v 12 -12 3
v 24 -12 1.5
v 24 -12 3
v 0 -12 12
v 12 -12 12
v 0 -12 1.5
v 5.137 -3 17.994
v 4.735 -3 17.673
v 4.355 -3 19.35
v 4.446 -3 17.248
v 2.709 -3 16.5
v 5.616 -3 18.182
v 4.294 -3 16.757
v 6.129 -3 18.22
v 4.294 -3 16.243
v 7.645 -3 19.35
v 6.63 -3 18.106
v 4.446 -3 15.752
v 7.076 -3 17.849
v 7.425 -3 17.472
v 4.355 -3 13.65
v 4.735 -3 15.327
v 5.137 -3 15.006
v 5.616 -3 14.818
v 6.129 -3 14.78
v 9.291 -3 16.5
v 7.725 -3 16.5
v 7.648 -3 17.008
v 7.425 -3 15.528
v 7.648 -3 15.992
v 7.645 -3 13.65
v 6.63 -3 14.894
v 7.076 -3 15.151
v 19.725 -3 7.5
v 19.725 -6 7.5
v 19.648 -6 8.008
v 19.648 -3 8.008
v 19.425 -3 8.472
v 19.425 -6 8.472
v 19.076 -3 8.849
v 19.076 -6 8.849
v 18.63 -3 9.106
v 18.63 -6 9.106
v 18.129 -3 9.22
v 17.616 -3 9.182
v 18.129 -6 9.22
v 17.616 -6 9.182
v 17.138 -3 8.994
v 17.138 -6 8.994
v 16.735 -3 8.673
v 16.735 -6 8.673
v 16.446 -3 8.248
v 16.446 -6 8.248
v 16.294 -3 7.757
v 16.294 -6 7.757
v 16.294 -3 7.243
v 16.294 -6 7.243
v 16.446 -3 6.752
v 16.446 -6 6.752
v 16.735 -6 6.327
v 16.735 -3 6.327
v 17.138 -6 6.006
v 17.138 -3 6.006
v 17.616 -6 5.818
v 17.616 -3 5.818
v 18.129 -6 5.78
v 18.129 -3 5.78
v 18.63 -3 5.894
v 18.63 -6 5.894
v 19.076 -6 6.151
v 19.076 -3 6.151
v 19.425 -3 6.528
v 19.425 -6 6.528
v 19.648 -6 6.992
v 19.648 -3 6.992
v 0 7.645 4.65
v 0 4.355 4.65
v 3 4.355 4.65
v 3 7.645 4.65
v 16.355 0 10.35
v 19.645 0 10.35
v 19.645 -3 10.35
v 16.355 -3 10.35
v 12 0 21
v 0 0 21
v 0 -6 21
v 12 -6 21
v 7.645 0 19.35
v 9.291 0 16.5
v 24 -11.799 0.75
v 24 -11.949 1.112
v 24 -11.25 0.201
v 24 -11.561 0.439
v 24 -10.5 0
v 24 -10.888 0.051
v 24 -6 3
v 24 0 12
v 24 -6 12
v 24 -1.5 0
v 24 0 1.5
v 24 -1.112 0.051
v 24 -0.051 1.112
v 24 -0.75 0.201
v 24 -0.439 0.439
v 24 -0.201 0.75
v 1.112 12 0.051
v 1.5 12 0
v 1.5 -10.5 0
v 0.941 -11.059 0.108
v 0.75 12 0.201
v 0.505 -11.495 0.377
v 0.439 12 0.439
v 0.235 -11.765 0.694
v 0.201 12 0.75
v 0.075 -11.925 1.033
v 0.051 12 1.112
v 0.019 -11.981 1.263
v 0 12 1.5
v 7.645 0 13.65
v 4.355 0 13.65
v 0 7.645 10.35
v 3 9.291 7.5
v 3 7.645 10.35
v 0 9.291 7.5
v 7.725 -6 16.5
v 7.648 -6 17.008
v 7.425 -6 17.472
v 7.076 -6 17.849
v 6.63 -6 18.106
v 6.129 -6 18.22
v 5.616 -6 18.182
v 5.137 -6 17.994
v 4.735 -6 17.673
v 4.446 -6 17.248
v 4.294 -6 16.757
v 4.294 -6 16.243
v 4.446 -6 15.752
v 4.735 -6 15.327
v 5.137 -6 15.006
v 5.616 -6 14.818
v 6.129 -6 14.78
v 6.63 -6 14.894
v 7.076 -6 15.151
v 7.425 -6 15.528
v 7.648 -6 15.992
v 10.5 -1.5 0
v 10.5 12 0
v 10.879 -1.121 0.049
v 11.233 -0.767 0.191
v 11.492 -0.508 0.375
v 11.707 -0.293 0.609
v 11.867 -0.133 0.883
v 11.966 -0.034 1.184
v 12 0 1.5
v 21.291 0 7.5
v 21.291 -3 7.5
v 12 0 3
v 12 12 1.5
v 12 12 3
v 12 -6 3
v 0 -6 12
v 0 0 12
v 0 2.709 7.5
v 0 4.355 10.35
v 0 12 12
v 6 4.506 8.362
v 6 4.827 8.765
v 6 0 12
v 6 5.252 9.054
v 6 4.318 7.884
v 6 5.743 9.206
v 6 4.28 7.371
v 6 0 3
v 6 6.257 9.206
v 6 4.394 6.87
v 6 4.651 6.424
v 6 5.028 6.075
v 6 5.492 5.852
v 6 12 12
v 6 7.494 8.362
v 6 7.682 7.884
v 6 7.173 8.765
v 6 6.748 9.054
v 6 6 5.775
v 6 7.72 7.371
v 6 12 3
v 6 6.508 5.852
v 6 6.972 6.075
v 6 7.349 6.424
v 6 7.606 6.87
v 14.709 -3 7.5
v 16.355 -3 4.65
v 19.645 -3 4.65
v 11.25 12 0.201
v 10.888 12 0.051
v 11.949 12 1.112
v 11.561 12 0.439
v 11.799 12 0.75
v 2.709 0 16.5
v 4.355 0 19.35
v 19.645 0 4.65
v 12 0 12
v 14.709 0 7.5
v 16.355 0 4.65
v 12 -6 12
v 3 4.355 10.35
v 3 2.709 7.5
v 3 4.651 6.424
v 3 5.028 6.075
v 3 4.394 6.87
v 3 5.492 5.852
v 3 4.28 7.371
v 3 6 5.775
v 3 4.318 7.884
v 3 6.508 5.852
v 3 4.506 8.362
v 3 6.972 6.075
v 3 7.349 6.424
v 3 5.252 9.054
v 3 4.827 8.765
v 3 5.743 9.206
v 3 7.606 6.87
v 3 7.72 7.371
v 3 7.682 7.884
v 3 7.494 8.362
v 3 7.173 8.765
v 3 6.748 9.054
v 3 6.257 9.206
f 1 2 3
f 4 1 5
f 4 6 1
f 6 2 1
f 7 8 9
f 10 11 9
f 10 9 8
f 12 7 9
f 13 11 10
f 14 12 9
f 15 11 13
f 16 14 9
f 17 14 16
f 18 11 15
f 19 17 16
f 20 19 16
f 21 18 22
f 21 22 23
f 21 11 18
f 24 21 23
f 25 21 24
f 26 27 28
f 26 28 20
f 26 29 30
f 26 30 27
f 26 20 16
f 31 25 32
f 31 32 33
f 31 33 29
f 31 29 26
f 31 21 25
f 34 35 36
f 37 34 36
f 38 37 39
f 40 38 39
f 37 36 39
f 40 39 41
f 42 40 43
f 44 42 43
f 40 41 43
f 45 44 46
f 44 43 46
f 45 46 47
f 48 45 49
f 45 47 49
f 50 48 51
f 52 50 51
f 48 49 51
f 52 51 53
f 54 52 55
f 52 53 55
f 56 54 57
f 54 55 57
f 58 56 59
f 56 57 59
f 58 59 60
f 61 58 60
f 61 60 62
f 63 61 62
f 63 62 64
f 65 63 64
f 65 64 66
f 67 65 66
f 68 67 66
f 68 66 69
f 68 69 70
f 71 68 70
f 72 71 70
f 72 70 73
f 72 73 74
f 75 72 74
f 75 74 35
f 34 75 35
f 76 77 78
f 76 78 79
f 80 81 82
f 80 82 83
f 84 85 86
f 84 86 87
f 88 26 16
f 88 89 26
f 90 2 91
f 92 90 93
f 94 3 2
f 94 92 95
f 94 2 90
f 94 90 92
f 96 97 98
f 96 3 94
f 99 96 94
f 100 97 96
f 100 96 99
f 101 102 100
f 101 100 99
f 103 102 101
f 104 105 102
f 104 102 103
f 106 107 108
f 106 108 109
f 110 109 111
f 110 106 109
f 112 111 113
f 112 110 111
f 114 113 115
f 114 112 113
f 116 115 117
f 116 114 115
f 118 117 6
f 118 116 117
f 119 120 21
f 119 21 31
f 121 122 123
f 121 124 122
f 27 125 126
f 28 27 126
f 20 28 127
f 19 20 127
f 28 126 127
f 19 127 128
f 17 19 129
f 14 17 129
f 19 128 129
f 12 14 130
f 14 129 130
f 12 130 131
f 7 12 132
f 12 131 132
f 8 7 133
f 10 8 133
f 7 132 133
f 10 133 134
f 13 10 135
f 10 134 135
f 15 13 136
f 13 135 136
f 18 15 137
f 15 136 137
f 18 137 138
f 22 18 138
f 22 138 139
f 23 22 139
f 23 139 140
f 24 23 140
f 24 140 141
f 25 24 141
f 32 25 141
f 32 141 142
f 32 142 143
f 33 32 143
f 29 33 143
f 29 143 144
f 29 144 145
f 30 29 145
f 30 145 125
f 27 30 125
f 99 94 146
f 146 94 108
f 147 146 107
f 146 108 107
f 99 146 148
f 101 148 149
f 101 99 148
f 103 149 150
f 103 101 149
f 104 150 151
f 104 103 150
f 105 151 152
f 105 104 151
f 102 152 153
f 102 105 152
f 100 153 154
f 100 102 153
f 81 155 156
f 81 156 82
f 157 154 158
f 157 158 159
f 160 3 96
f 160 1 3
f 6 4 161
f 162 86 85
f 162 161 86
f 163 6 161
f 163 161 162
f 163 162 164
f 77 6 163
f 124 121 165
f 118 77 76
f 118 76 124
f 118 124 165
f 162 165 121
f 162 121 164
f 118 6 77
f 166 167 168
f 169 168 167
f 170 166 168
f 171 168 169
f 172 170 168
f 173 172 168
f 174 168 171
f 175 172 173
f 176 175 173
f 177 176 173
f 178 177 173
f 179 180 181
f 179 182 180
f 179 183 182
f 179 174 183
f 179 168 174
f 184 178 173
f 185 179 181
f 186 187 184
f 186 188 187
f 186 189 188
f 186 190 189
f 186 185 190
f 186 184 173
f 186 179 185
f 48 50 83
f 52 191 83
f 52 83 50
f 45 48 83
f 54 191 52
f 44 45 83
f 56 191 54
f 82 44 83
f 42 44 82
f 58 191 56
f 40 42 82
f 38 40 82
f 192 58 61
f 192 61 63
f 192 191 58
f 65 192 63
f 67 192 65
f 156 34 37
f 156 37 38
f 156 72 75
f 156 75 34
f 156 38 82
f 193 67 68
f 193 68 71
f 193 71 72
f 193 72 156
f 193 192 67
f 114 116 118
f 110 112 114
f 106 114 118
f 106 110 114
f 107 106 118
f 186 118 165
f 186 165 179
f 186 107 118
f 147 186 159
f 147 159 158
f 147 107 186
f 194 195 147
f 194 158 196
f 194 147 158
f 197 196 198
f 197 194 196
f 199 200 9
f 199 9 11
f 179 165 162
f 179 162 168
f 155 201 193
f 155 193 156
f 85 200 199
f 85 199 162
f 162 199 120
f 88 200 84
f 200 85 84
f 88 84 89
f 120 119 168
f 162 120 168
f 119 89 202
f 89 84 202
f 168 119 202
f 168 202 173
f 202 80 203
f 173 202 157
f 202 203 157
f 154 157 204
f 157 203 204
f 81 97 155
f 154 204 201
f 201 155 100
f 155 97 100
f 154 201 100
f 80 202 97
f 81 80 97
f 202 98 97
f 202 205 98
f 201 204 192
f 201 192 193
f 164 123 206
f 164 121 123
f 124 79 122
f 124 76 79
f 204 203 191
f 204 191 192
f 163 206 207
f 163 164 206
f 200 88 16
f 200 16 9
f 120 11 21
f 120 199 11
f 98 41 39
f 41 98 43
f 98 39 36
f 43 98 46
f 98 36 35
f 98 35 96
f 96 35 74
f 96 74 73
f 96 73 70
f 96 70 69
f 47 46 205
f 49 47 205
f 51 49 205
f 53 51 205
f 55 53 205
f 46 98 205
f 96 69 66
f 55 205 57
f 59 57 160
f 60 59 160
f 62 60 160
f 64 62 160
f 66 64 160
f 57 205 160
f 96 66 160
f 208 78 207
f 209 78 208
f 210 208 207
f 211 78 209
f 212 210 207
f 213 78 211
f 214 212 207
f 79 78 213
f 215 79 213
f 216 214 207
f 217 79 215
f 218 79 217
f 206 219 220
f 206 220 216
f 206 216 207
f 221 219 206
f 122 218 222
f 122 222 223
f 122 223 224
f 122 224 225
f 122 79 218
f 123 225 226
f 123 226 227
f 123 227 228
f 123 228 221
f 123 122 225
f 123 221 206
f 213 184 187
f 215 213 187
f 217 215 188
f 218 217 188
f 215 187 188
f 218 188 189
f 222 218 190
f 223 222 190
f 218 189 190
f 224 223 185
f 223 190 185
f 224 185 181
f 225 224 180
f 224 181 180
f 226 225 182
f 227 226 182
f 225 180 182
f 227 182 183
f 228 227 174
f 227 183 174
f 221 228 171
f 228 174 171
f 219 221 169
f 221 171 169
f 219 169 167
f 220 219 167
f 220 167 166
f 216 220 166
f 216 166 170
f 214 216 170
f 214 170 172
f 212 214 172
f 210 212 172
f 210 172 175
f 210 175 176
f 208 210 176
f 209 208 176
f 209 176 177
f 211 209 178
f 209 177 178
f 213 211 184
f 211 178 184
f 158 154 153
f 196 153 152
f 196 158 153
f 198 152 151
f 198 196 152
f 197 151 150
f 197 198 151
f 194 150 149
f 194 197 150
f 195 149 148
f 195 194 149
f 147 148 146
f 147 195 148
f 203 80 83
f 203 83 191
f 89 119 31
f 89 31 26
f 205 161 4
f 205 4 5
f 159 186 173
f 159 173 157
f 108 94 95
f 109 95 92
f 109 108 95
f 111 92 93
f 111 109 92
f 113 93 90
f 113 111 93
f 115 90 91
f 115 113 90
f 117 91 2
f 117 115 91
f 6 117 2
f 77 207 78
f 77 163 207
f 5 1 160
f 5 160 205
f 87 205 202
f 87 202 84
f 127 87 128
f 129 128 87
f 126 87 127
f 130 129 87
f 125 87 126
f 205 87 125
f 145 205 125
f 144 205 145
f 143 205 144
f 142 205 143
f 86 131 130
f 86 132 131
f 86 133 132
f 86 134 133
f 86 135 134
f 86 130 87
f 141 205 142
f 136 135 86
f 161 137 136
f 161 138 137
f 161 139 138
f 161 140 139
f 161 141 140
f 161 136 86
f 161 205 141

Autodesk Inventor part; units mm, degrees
ref_plane "YZ Plane" through (0, 0, 0) normal (1, 0, 0) x (0, 1, 0)
ref_plane "XZ Plane" through (0, 0, 0) normal (0, 1, 0) x (-1, 0, 0)
ref_plane "XY Plane" through (0, 0, 0) normal (0, 0, 1) x (1, 0, 0)
sketch "Sketch1" plane through (0, 0, 0) normal (0, 0, 1) x (1, 0, 0)
  line L0 (0, 0) -> (12, 0)
  line L1 (12, 0) -> (12, 12)
  line L2 (12, 12) -> (0, 12)
  line L3 (0, 12) -> (0, 0)
  line L4 (12, 0) -> (0, 0)
  line L5 (0, 0) -> (0, -12)
  line L6 (0, -12) -> (12, -12)
  line L7 (12, -12) -> (12, 0)
  line L8 (12, 0) -> (24, 0)
  line L9 (24, 0) -> (24, -12)
  line L10 (24, -12) -> (12, -12)
  line L11 (12, -12) -> (12, 0)
  line L12 (0, -12) -> (-12, -12)
  line L13 (-12, -12) -> (-12, 0)
  line L14 (-12, 0) -> (0, 0)
  line L15 (0, 0) -> (0, -12)
  line L16 (0, -12) -> (12, -12)
  line L17 (12, -12) -> (12, -24)
  line L18 (12, -24) -> (0, -24)
  line L19 (0, -24) -> (0, -12)
  dimension "d0" = 12
  dimension "d1" = 12
  dimension "d2" = 12
  dimension "d3" = 12
  dimension "d4" = 12
  dimension "d5" = 12
  dimension "d6" = 12
  dimension "d7" = 12
  dimension "d8" = 12
  dimension "d9" = 12
extrude "Extrusion1" add sketch "Sketch1" along normal blind 3
sketch "Sketch2" plane through (0, 0, 3) normal (0, 0, 1) x (1, 0, 0)
  line L0 (-12, 0) -> (-12, -12) projected
  line L1 (-12, -12) -> (-12, -6)
  line L2 (-12, -6) -> (0, -6)
  line L3 (-12, -12) -> (0, -12) projected
  line L4 (0, -6) -> (0, -12)
  line L5 (0, -12) -> (-12, -12)
  line L6 (12, -24) -> (12, -12) projected
  line L7 (12, -12) -> (12, -6)
  line L8 (12, -6) -> (24, -6)
  line L9 (24, -12) -> (24, 0) projected
  line L10 (12, -12) -> (24, -12) projected
  line L11 (24, -6) -> (24, -12)
  line L12 (24, -12) -> (12, -12)
  line L13 (0, 0) -> (0, -6)
  line L14 (12, 0) -> (12, 12) projected
  line L15 (0, 0) -> (12, 0)
  line L16 (12, 0) -> (12, -6)
  line L17 (12, -12) -> (0, -12)
  line L18 (0, 12) -> (0, 0) projected
  line L19 (0, 0) -> (0, 12)
  line L20 (0, 12) -> (6, 12)
  line L21 (12, 12) -> (0, 12) projected
  line L22 (6, 12) -> (6, 0)
  line L23 (6, 0) -> (0, 0)
  line L24 (0, -12) -> (0, -24) projected
  line L25 (0, -12) -> (0, -24)
  line L26 (0, -24) -> (6, -24)
  line L27 (0, -24) -> (12, -24) projected
  line L28 (6, -24) -> (6, -12)
  line L29 (6, -12) -> (0, -12)
  dimension "d12" = 6
  dimension "d13" = 12
extrude "Extrusion2" add sketch "Sketch2" along normal blind 9 contours L2 L4 L3 L0 | L13 L15 L16 L7 L17 L4 | L17 L28 L26 L24 | L18 L20 L22 L15 | L7 L8 L9 L10
sketch "Sketch3" plane through (0, 0, 12) normal (0, 0, 1) x (1, 0, 0)
  line L0 (0, -6) -> (12, -6)
  line L1 (12, -12) -> (6, -12) projected
  line L2 (12, -6) -> (12, -12)
  line L3 (0, -12) -> (0, -24) projected
  line L4 (12, -12) -> (0, -12)
  line L5 (0, -12) -> (0, -6)
  point P0 (0, 0)
extrude "Extrusion3" add sketch "Sketch3" along normal blind 9
sketch "Sketch4" plane through (6, -12, 3) normal (0, -1, 0) x (1, 0, 0)
  point P0 (-6, -3)
sketch "Sketch5" plane through (-12, -6, 3) normal (0, 1, 0) x (1, 0, 0)
  circle A0 centre (6, -4.5) radius 1.725
  line L0 (0, 0) -> (0, -9) projected
  line L1 (12, -9) -> (0, -9) projected
  circle A1 centre (18, -13.5) radius 1.725
  line L2 (24, -18) -> (12, -18) projected
  line L3 (24, -9) -> (24, -18) projected
  circle A2 centre (30, -4.5) radius 1.725
  line L4 (36, 0) -> (36, -9) projected
  line L5 (36, -9) -> (24, -9) projected
  point P0 (12, 3)
  dimension "d19" = 3.45
  dimension "d20" = 6
  dimension "d21" = 4.5
  dimension "d22" = 3.45
  dimension "d23" = 4.5
  dimension "d24" = 6
  dimension "d25" = 3.45
  dimension "d26" = 6
  dimension "d27" = 4.5
extrude "Extrusion4" cut sketch "Sketch5" against normal blind 3
sketch "Sketch6" plane through (6, -12, 3) normal (0, -1, 0) x (1, 0, 0)
  circle A0 centre (-12, 4.5) radius 1.725 projected
  line L0 (-10.3546, 7.35) -> (-8.7091, 4.5)
  line L1 (-8.7091, 4.5) -> (-10.3546, 1.65)
  line L2 (-10.3546, 1.65) -> (-13.6454, 1.65)
  line L3 (-13.6454, 1.65) -> (-15.2909, 4.5)
  line L4 (-15.2909, 4.5) -> (-13.6454, 7.35)
  line L5 (-13.6454, 7.35) -> (-10.3546, 7.35)
  circle A1 centre (12, 4.5) radius 1.725 projected
  line L6 (13.6454, 7.35) -> (15.2909, 4.5)
  line L7 (15.2909, 4.5) -> (13.6454, 1.65)
  line L8 (13.6454, 1.65) -> (10.3546, 1.65)
  line L9 (10.3546, 1.65) -> (8.7091, 4.5)
  line L10 (8.7091, 4.5) -> (10.3546, 7.35)
  line L11 (10.3546, 7.35) -> (13.6454, 7.35)
  circle A2 centre (0, 13.5) radius 1.725 projected
  line L12 (1.6454, 16.35) -> (3.2909, 13.5)
  line L13 (3.2909, 13.5) -> (1.6454, 10.65)
  line L14 (1.6454, 10.65) -> (-1.6454, 10.65)
  line L15 (-1.6454, 10.65) -> (-3.2909, 13.5)
  line L16 (-3.2909, 13.5) -> (-1.6454, 16.35)
  line L17 (-1.6454, 16.35) -> (1.6454, 16.35)
  point P0 (-6, -3)
  dimension "d30" = 2.85
  dimension "d31" = 2.85
  dimension "d32" = 2.85
extrude "Extrusion5" cut sketch "Sketch6" against normal blind 3 contours A0 | L0 L1 L2 L3 L4 L5 | A1 | L6 L7 L8 L9 L10 L11 | A2 | L12 L13 L14 L15 L16 L17
sketch "Sketch7" plane through (6, 0, 3) normal (1, 0, 0) x (0, 0, -1)
  circle A0 centre (-4.5, 6) radius 1.725
  circle A1 centre (-4.5, -18) radius 1.725
  line L0 (-9, 0) -> (-9, 12) projected
  line L1 (-9, -24) -> (-9, -12) projected
  line L2 (0, -24) -> (-9, -24) projected
  line L3 (0, 12) -> (-9, 12) projected
  point P0 (3, 0)
  dimension "d35" = 3.45
  dimension "d36" = 3.45
  dimension "d37" = 4.5
  dimension "d38" = 4.5
  dimension "d39" = 6
  dimension "d40" = 6
extrude "Extrusion6" cut sketch "Sketch7" against normal blind 3
sketch "Sketch8" plane through (0, -6, 3) normal (-1, 0, 0) x (0, 0, 1)
  circle A0 centre (4.5, 12) radius 1.725 projected
  line L0 (1.65, 13.6454) -> (4.5, 15.2909)
  line L1 (4.5, 15.2909) -> (7.35, 13.6454)
  line L2 (7.35, 13.6454) -> (7.35, 10.3546)
  line L3 (7.35, 10.3546) -> (4.5, 8.7091)
  line L4 (4.5, 8.7091) -> (1.65, 10.3546)
  line L5 (1.65, 10.3546) -> (1.65, 13.6454)
  circle A1 centre (4.5, -12) radius 1.725 projected
  line L6 (1.65, -10.3546) -> (4.5, -8.7091)
  line L7 (4.5, -8.7091) -> (7.35, -10.3546)
  line L8 (7.35, -10.3546) -> (7.35, -13.6454)
  line L9 (7.35, -13.6454) -> (4.5, -15.2909)
  line L10 (4.5, -15.2909) -> (1.65, -13.6454)
  line L11 (1.65, -13.6454) -> (1.65, -10.3546)
  point P0 (-3, 6)
  dimension "d43" = 2.85
  dimension "d44" = 2.85
extrude "Extrusion7" cut sketch "Sketch8" against normal blind 3 contours A0 | L0 L1 L2 L3 L4 L5 | A1 | L6 L7 L8 L9 L10 L11
sketch "Sketch9" plane through (0, 0, 0) normal (0, 0, -1) x (-1, 0, 0)
  line L0 (-24, -12) -> (-24, 0) projected
  line L1 (-12, -12) -> (-12, -6) projected
  line L2 (-24, 0) -> (-12, 0)
  line L3 (-12, 0) -> (-12, -12)
  line L4 (-12, -12) -> (-24, -12)
  line L5 (-24, -12) -> (-24, 0)
  line L6 (-12, -12) -> (0, -12)
  line L7 (0, -12) -> (0, -24)
  line L8 (0, -24) -> (-12, -24)
  line L9 (-12, -24) -> (-12, -12)
  point P0 (0, 0)
extrude "Extrusion8" cut sketch "Sketch9" against normal through all
sketch "Sketch10" plane through (0, 12, 12) normal (0, 1, 0) x (1, 0, 0)
  line L0 (6, 0) -> (0, 0) projected
  line L1 (12, 9) -> (6, 9) projected
  line L2 (0, 0) -> (6, 0)
  line L3 (6, 0) -> (6, 9)
  line L4 (6, 9) -> (0, 9)
  line L5 (0, 9) -> (0, 0)
  point P0 (0, 12)
extrude "Extrusion9" cut sketch "Sketch10" against normal blind 12
sketch "Sketch11" plane through (0, 0, 3) normal (0, 1, 0) x (1, 0, 0)
  line L0 (12, 0) -> (12, -9) projected
  line L1 (12, 0) -> (0, 0) projected
  line L2 (12, -9) -> (6, -9)
  line L3 (6, -9) -> (6, 0)
  line L4 (6, 0) -> (12, 0)
  line L5 (12, 0) -> (12, -9)
  point P0 (0, 3)
extrude "Extrusion10" add sketch "Sketch11" along normal blind 12
sketch "Sketch12" plane through (6, 0, 3) normal (-1, 0, 0) x (0, 0, 1)
  circle A0 centre (4.5, 6) radius 1.575
  line L0 (9, 0) -> (9, 12) projected
  line L1 (0, 12) -> (9, 12) projected
  point P0 (-3, 0)
  dimension "d54" = 3.15
  dimension "d55" = 4.5
  dimension "d56" = 6
extrude "Extrusion11" cut sketch "Sketch12" against normal blind 3
sketch "Sketch13" plane through (12, -6, 12) normal (1, 0, 0) x (0, 0, -1)
  circle A0 centre (4.5, 12) radius 1.575 projected
  line L0 (1.65, 13.6454) -> (4.5, 15.2909)
  line L1 (4.5, 15.2909) -> (7.35, 13.6454)
  line L2 (7.35, 13.6454) -> (7.35, 10.3546)
  line L3 (7.35, 10.3546) -> (4.5, 8.7091)
  line L4 (4.5, 8.7091) -> (1.65, 10.3546)
  line L5 (1.65, 10.3546) -> (1.65, 13.6454)
  point P0 (12, 6)
  dimension "d59" = 5.7
extrude "Extrusion12" cut sketch "Sketch13" against normal blind 3 contours A0 | L0 L1 L2 L3 L4 L5
sketch "Sketch14" plane through (0, -6, 3) normal (-1, 0, 0) x (0, 0, 1)
  line L0 (9, 6) -> (0, 6) projected
  line L1 (0, 6) -> (0, 0) projected
  line L2 (9, 6) -> (0, 6)
  line L3 (0, 6) -> (0, 0)
  line L4 (0, 0) -> (9, 0)
  line L5 (9, 0) -> (9, 6)
  point P0 (-3, 6)
extrude "Extrusion13" add sketch "Sketch14" along normal blind 12
sketch "Sketch15" plane through (-12, -12, 0) normal (-1, 0, 0) x (0, 0, 1)
  line L0 (12, 0) -> (12, 6) projected
  line L1 (12, 0) -> (3, 0)
  line L2 (3, 0) -> (3, 6)
  line L3 (3, 6) -> (12, 6)
  line L4 (12, 6) -> (12, 0)
  point P0 (0, 12)
  dimension "d64" = 9
  dimension "d65" = 6
extrude "Extrusion14" cut sketch "Sketch15" against normal blind 12
sketch "Sketch16" plane through (-12, -6, 12) normal (0, -1, 0) x (1, 0, 0)
  circle A0 centre (6, -4.5) radius 1.725
  line L0 (0, -9) -> (0, 0) projected
  line L1 (0, 0) -> (12, 0) projected
  point P0 (12, -12)
  dimension "d68" = 3.45
  dimension "d69" = 6
  dimension "d70" = 4.5
extrude "Extrusion15" cut sketch "Sketch16" against normal blind 3
sketch "Sketch17" plane through (-12, 0, 0) normal (0, 1, 0) x (1, 0, 0)
  circle A0 centre (6, -7.5) radius 1.725 projected
  line L0 (4.3546, -10.35) -> (2.7091, -7.5)
  line L1 (2.7091, -7.5) -> (4.3546, -4.65)
  line L2 (4.3546, -4.65) -> (7.6454, -4.65)
  line L3 (7.6454, -4.65) -> (9.2909, -7.5)
  line L4 (9.2909, -7.5) -> (7.6454, -10.35)
  line L5 (7.6454, -10.35) -> (4.3546, -10.35)
  point P0 (12, 0)
  dimension "d73" = 5.7
extrude "Extrusion16" cut sketch "Sketch17" against normal blind 3 contours A0 | L0 L1 L2 L3 L4 L5
sketch "Sketch18" plane through (0, 0, 12) normal (0, 0, 1) x (1, 0, 0)
  line L0 (12, -6) -> (12, 12) projected
  line L1 (0, 0) -> (12, 0)
  line L2 (12, 0) -> (12, -6)
  line L3 (12, -6) -> (0, -6)
  line L4 (0, -6) -> (0, 0)
extrude "Extrusion17" add sketch "Sketch18" along normal blind 9
sketch "Sketch19" plane through (0, 0, 21) normal (0, 0, 1) x (1, 0, 0)
  line L0 (0, -12) -> (12, -12) projected
  line L1 (12, -12) -> (12, 0) projected
  line L2 (0, -12) -> (12, -12)
  line L3 (12, -12) -> (12, -6)
  line L4 (12, -6) -> (0, -6)
  line L5 (0, -6) -> (0, -12)
  point P0 (0, 0)
extrude "Extrusion18" cut sketch "Sketch19" against normal blind 9
sketch "Sketch20" plane through (0, -6, 21) normal (0, -1, 0) x (1, 0, 0)
  circle A0 centre (6, -4.5) radius 1.725
  line L0 (0, 0) -> (12, 0) projected
  line L1 (0, -9) -> (0, 0) projected
  point P0 (0, -21)
  dimension "d80" = 3.45
  dimension "d81" = 4.5
  dimension "d82" = 6
extrude "Extrusion19" cut sketch "Sketch20" against normal blind 3
sketch "Sketch21" plane through (-12, 0, 0) normal (0, 1, 0) x (1, 0, 0)
  circle A0 centre (18, -16.5) radius 1.725 projected
  line L0 (16.3546, -19.35) -> (14.7091, -16.5)
  line L1 (14.7091, -16.5) -> (16.3546, -13.65)
  line L2 (16.3546, -13.65) -> (19.6454, -13.65)
  line L3 (19.6454, -13.65) -> (21.2909, -16.5)
  line L4 (21.2909, -16.5) -> (19.6454, -19.35)
  line L5 (19.6454, -19.35) -> (16.3546, -19.35)
  point P0 (12, 0)
  dimension "d85" = 5.7
extrude "Extrusion20" cut sketch "Sketch21" against normal blind 3 contours A0 | L0 L1 L2 L3 L4 L5
sketch "Sketch22" plane through (12, -12, 0) normal (1, 0, 0) x (0, 0, -1)
  line L0 (-12, 6) -> (-12, 12) projected
  line L1 (0, 24) -> (0, 12) projected
  line L2 (-12, 6) -> (-3, 6)
  line L3 (0, 0) -> (0, 12)
  line L4 (0, 12) -> (-12, 12)
  line L5 (-12, 12) -> (-12, 6)
  line L6 (0, 0) -> (-12, 0) projected
  line L7 (-3, 6) -> (-12, 6) projected
  line L8 (0, 0) -> (-3, 0)
  line L9 (-3, 0) -> (-3, 6)
  line L10 (0, 12) -> (0, 0)
extrude "Extrusion21" add sketch "Sketch22" along normal blind 12
sketch "Sketch23" plane through (12, -6, 3) normal (0, -1, 0) x (1, 0, 0)
  circle A0 centre (6, 4.5) radius 1.725
  line L0 (0, 9) -> (12, 9) projected
  line L1 (12, 9) -> (12, 0) projected
  point P0 (-12, -3)
  dimension "d91" = 3.45
  dimension "d92" = 4.5
  dimension "d93" = 6
extrude "Extrusion22" cut sketch "Sketch23" against normal blind 3
sketch "Sketch24" plane through (12, 0, 12) normal (0, 1, 0) x (1, 0, 0)
  circle A0 centre (6, 4.5) radius 1.725 projected
  line L0 (4.3546, 1.65) -> (2.7091, 4.5)
  line L1 (2.7091, 4.5) -> (4.3546, 7.35)
  line L2 (4.3546, 7.35) -> (7.6454, 7.35)
  line L3 (7.6454, 7.35) -> (9.2909, 4.5)
  line L4 (9.2909, 4.5) -> (7.6454, 1.65)
  line L5 (7.6454, 1.65) -> (4.3546, 1.65)
  point P0 (-12, 12)
  dimension "d96" = 5.7
extrude "Extrusion23" cut sketch "Sketch24" against normal blind 3 contours A0 | L0 L1 L2 L3 L4 L5
sketch "Sketch25" plane through (0, 0, 0) normal (0, 0, -1) x (-1, 0, 0)
  line L0 (12, -12) -> (-24, -12) projected
  line L1 (0, 12) -> (0, 0) projected
  line L2 (12, -12) -> (0, -12)
  line L3 (0, -12) -> (0, 0)
  line L4 (0, 0) -> (12, 0)
  line L5 (12, 0) -> (12, -12)
extrude "Extrusion24" cut sketch "Sketch25" against normal through all
fillet "Fillet5" radius 1.5 4 edges at (12, -12, 0) (18, 0, 0) (0, 0, 0) (12, 6, 0)
sketch "Sketch26" plane through (0, 0, 3) normal (0, 0, 1) x (1, 0, 0)
  line L0 (4.3546, 0) -> (7.6454, 0) projected
  line L1 (0, -12) -> (0, 12) projected
  line L2 (6, 0) -> (0, 0)
  line L3 (0, 0) -> (0, 12)
  line L4 (0, 12) -> (6, 12)
  line L5 (6, 12) -> (6, 0)
extrude "Extrusion25" add sketch "Sketch26" along normal blind 9
sketch "Sketch27" plane through (0, 12, 12) normal (0, 1, 0) x (1, 0, 0)
  line L0 (12, 0) -> (12, -9) projected
  line L1 (12, 0) -> (6, 0)
  line L2 (6, 0) -> (6, 9)
  line L3 (6, 9) -> (12, 9)
  line L4 (12, 9) -> (12, 0)
  point P0 (0, 12)
  dimension "d105" = 6
  dimension "d106" = 9
extrude "Extrusion26" cut sketch "Sketch27" against normal blind 12
sketch "Sketch28" plane through (6, 0, 12) normal (1, 0, 0) x (0, 0, -1)
  circle A0 centre (4.5, 6) radius 1.725
  line L0 (0, 0) -> (0, 12) projected
  line L1 (0, 12) -> (9, 12) projected
  point P0 (12, 0)
  dimension "d109" = 3.45
  dimension "d110" = 4.5
  dimension "d111" = 6
extrude "Extrusion27" cut sketch "Sketch28" against normal blind 3
sketch "Sketch29" plane through (0, 0, 12) normal (-1, 0, 0) x (0, 0, 1)
  circle A0 centre (-4.5, 6) radius 1.725 projected
  line L0 (-7.35, 7.6454) -> (-4.5, 9.2909)
  line L1 (-4.5, 9.2909) -> (-1.65, 7.6454)
  line L2 (-1.65, 7.6454) -> (-1.65, 4.3546)
  line L3 (-1.65, 4.3546) -> (-4.5, 2.7091)
  line L4 (-4.5, 2.7091) -> (-7.35, 4.3546)
  line L5 (-7.35, 4.3546) -> (-7.35, 7.6454)
  point P0 (-12, 0)
  dimension "d114" = 5.7
extrude "Extrusion28" cut sketch "Sketch29" against normal blind 3 contours A0 | L0 L1 L2 L3 L4 L5
properties part number "topCornWS"
